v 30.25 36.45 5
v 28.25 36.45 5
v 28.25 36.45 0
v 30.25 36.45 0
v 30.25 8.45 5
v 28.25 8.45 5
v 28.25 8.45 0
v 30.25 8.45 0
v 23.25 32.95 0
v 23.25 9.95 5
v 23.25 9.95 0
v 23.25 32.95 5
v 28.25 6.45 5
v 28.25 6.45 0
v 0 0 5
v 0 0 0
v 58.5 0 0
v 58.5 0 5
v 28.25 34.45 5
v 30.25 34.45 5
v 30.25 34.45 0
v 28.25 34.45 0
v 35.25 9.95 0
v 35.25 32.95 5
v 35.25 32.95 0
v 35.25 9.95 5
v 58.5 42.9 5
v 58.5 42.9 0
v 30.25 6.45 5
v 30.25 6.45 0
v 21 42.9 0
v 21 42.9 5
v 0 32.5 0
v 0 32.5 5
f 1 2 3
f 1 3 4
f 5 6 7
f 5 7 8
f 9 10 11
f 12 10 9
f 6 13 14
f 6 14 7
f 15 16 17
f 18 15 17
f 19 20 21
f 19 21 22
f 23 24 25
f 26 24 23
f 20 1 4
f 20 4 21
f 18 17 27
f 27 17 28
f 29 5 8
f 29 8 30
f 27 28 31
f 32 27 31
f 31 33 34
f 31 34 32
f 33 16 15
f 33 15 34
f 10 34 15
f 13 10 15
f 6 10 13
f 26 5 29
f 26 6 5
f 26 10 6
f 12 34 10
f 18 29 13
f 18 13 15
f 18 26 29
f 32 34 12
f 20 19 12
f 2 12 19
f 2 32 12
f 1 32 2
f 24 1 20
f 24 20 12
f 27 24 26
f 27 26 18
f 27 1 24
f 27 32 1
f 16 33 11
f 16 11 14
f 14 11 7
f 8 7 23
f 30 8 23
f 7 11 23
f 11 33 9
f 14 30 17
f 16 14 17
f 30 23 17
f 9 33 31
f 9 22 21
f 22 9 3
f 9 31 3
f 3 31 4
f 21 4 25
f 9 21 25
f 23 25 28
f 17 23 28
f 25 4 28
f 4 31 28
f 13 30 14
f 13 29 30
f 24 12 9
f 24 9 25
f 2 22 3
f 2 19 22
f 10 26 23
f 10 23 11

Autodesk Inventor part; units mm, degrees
ref_plane "YZ Plane" through (0, 0, 0) normal (1, 0, 0) x (0, 1, 0)
ref_plane "XZ Plane" through (0, 0, 0) normal (0, 1, 0) x (-1, 0, 0)
ref_plane "XY Plane" through (0, 0, 0) normal (0, 0, 1) x (1, 0, 0)
sketch "Esquisse1" plane through (0, 0, 0) normal (0, 0, 1) x (1, 0, 0)
  line L0 (0, 0) -> (0, 32.5)
  line L1 (0, 0) -> (58.5, 0)
  line L2 (58.5, 0) -> (58.5, 42.9)
  line L3 (58.5, 42.9) -> (21, 42.9)
  line L4 (0, 32.5) -> (21, 42.9)
  line L5 (58.5, 42.9) -> (0, 42.9) construction
  line L6 (0, 42.9) -> (0, 0) construction
  line L7 (0, 42.9) -> (58.5, 0) construction
  line L8 (58.5, 42.9) -> (0, 0) construction
  dimension "d0" = 32.5
  dimension "d1" = 58.5
  dimension "d2" = 42.9
  dimension "d3" = 37.5
extrude "Extrusion1" add sketch "Esquisse1" along normal blind 5
sketch "Esquisse2" plane through (0, 0, 5) normal (0, 0, 1) x (1, 0, 0)
  line L0 (23.25, 32.95) -> (35.25, 32.95)
  line L1 (35.25, 32.95) -> (35.25, 9.95)
  line L2 (35.25, 9.95) -> (23.25, 9.95)
  line L3 (23.25, 9.95) -> (23.25, 32.95)
  line L4 (0, 32.5) -> (0, 0) projected
  line L5 (58.5, 42.9) -> (21, 42.9) projected
  line L6 (28.25, 36.45) -> (30.25, 36.45)
  line L7 (30.25, 36.45) -> (30.25, 34.45)
  line L8 (30.25, 34.45) -> (28.25, 34.45)
  line L9 (28.25, 34.45) -> (28.25, 36.45)
  line L10 (28.25, 8.45) -> (30.25, 8.45)
  line L11 (30.25, 8.45) -> (30.25, 6.45)
  line L12 (30.25, 6.45) -> (28.25, 6.45)
  line L13 (28.25, 6.45) -> (28.25, 8.45)
  dimension "d6" = 23
  dimension "d7" = 12
  dimension "d8" = 23.25
  dimension "d9" = 9.95
  dimension "d10" = 2
  dimension "d11" = 2
  dimension "d12" = 2
  dimension "d13" = 2
  dimension "d14" = 1.5
  dimension "d15" = 1.5
  dimension "d16" = 5
  dimension "d17" = 5
extrude "Extrusion2" cut sketch "Esquisse2" against normal blind 5
properties part number "BackHand" material "Plastique ABS"
